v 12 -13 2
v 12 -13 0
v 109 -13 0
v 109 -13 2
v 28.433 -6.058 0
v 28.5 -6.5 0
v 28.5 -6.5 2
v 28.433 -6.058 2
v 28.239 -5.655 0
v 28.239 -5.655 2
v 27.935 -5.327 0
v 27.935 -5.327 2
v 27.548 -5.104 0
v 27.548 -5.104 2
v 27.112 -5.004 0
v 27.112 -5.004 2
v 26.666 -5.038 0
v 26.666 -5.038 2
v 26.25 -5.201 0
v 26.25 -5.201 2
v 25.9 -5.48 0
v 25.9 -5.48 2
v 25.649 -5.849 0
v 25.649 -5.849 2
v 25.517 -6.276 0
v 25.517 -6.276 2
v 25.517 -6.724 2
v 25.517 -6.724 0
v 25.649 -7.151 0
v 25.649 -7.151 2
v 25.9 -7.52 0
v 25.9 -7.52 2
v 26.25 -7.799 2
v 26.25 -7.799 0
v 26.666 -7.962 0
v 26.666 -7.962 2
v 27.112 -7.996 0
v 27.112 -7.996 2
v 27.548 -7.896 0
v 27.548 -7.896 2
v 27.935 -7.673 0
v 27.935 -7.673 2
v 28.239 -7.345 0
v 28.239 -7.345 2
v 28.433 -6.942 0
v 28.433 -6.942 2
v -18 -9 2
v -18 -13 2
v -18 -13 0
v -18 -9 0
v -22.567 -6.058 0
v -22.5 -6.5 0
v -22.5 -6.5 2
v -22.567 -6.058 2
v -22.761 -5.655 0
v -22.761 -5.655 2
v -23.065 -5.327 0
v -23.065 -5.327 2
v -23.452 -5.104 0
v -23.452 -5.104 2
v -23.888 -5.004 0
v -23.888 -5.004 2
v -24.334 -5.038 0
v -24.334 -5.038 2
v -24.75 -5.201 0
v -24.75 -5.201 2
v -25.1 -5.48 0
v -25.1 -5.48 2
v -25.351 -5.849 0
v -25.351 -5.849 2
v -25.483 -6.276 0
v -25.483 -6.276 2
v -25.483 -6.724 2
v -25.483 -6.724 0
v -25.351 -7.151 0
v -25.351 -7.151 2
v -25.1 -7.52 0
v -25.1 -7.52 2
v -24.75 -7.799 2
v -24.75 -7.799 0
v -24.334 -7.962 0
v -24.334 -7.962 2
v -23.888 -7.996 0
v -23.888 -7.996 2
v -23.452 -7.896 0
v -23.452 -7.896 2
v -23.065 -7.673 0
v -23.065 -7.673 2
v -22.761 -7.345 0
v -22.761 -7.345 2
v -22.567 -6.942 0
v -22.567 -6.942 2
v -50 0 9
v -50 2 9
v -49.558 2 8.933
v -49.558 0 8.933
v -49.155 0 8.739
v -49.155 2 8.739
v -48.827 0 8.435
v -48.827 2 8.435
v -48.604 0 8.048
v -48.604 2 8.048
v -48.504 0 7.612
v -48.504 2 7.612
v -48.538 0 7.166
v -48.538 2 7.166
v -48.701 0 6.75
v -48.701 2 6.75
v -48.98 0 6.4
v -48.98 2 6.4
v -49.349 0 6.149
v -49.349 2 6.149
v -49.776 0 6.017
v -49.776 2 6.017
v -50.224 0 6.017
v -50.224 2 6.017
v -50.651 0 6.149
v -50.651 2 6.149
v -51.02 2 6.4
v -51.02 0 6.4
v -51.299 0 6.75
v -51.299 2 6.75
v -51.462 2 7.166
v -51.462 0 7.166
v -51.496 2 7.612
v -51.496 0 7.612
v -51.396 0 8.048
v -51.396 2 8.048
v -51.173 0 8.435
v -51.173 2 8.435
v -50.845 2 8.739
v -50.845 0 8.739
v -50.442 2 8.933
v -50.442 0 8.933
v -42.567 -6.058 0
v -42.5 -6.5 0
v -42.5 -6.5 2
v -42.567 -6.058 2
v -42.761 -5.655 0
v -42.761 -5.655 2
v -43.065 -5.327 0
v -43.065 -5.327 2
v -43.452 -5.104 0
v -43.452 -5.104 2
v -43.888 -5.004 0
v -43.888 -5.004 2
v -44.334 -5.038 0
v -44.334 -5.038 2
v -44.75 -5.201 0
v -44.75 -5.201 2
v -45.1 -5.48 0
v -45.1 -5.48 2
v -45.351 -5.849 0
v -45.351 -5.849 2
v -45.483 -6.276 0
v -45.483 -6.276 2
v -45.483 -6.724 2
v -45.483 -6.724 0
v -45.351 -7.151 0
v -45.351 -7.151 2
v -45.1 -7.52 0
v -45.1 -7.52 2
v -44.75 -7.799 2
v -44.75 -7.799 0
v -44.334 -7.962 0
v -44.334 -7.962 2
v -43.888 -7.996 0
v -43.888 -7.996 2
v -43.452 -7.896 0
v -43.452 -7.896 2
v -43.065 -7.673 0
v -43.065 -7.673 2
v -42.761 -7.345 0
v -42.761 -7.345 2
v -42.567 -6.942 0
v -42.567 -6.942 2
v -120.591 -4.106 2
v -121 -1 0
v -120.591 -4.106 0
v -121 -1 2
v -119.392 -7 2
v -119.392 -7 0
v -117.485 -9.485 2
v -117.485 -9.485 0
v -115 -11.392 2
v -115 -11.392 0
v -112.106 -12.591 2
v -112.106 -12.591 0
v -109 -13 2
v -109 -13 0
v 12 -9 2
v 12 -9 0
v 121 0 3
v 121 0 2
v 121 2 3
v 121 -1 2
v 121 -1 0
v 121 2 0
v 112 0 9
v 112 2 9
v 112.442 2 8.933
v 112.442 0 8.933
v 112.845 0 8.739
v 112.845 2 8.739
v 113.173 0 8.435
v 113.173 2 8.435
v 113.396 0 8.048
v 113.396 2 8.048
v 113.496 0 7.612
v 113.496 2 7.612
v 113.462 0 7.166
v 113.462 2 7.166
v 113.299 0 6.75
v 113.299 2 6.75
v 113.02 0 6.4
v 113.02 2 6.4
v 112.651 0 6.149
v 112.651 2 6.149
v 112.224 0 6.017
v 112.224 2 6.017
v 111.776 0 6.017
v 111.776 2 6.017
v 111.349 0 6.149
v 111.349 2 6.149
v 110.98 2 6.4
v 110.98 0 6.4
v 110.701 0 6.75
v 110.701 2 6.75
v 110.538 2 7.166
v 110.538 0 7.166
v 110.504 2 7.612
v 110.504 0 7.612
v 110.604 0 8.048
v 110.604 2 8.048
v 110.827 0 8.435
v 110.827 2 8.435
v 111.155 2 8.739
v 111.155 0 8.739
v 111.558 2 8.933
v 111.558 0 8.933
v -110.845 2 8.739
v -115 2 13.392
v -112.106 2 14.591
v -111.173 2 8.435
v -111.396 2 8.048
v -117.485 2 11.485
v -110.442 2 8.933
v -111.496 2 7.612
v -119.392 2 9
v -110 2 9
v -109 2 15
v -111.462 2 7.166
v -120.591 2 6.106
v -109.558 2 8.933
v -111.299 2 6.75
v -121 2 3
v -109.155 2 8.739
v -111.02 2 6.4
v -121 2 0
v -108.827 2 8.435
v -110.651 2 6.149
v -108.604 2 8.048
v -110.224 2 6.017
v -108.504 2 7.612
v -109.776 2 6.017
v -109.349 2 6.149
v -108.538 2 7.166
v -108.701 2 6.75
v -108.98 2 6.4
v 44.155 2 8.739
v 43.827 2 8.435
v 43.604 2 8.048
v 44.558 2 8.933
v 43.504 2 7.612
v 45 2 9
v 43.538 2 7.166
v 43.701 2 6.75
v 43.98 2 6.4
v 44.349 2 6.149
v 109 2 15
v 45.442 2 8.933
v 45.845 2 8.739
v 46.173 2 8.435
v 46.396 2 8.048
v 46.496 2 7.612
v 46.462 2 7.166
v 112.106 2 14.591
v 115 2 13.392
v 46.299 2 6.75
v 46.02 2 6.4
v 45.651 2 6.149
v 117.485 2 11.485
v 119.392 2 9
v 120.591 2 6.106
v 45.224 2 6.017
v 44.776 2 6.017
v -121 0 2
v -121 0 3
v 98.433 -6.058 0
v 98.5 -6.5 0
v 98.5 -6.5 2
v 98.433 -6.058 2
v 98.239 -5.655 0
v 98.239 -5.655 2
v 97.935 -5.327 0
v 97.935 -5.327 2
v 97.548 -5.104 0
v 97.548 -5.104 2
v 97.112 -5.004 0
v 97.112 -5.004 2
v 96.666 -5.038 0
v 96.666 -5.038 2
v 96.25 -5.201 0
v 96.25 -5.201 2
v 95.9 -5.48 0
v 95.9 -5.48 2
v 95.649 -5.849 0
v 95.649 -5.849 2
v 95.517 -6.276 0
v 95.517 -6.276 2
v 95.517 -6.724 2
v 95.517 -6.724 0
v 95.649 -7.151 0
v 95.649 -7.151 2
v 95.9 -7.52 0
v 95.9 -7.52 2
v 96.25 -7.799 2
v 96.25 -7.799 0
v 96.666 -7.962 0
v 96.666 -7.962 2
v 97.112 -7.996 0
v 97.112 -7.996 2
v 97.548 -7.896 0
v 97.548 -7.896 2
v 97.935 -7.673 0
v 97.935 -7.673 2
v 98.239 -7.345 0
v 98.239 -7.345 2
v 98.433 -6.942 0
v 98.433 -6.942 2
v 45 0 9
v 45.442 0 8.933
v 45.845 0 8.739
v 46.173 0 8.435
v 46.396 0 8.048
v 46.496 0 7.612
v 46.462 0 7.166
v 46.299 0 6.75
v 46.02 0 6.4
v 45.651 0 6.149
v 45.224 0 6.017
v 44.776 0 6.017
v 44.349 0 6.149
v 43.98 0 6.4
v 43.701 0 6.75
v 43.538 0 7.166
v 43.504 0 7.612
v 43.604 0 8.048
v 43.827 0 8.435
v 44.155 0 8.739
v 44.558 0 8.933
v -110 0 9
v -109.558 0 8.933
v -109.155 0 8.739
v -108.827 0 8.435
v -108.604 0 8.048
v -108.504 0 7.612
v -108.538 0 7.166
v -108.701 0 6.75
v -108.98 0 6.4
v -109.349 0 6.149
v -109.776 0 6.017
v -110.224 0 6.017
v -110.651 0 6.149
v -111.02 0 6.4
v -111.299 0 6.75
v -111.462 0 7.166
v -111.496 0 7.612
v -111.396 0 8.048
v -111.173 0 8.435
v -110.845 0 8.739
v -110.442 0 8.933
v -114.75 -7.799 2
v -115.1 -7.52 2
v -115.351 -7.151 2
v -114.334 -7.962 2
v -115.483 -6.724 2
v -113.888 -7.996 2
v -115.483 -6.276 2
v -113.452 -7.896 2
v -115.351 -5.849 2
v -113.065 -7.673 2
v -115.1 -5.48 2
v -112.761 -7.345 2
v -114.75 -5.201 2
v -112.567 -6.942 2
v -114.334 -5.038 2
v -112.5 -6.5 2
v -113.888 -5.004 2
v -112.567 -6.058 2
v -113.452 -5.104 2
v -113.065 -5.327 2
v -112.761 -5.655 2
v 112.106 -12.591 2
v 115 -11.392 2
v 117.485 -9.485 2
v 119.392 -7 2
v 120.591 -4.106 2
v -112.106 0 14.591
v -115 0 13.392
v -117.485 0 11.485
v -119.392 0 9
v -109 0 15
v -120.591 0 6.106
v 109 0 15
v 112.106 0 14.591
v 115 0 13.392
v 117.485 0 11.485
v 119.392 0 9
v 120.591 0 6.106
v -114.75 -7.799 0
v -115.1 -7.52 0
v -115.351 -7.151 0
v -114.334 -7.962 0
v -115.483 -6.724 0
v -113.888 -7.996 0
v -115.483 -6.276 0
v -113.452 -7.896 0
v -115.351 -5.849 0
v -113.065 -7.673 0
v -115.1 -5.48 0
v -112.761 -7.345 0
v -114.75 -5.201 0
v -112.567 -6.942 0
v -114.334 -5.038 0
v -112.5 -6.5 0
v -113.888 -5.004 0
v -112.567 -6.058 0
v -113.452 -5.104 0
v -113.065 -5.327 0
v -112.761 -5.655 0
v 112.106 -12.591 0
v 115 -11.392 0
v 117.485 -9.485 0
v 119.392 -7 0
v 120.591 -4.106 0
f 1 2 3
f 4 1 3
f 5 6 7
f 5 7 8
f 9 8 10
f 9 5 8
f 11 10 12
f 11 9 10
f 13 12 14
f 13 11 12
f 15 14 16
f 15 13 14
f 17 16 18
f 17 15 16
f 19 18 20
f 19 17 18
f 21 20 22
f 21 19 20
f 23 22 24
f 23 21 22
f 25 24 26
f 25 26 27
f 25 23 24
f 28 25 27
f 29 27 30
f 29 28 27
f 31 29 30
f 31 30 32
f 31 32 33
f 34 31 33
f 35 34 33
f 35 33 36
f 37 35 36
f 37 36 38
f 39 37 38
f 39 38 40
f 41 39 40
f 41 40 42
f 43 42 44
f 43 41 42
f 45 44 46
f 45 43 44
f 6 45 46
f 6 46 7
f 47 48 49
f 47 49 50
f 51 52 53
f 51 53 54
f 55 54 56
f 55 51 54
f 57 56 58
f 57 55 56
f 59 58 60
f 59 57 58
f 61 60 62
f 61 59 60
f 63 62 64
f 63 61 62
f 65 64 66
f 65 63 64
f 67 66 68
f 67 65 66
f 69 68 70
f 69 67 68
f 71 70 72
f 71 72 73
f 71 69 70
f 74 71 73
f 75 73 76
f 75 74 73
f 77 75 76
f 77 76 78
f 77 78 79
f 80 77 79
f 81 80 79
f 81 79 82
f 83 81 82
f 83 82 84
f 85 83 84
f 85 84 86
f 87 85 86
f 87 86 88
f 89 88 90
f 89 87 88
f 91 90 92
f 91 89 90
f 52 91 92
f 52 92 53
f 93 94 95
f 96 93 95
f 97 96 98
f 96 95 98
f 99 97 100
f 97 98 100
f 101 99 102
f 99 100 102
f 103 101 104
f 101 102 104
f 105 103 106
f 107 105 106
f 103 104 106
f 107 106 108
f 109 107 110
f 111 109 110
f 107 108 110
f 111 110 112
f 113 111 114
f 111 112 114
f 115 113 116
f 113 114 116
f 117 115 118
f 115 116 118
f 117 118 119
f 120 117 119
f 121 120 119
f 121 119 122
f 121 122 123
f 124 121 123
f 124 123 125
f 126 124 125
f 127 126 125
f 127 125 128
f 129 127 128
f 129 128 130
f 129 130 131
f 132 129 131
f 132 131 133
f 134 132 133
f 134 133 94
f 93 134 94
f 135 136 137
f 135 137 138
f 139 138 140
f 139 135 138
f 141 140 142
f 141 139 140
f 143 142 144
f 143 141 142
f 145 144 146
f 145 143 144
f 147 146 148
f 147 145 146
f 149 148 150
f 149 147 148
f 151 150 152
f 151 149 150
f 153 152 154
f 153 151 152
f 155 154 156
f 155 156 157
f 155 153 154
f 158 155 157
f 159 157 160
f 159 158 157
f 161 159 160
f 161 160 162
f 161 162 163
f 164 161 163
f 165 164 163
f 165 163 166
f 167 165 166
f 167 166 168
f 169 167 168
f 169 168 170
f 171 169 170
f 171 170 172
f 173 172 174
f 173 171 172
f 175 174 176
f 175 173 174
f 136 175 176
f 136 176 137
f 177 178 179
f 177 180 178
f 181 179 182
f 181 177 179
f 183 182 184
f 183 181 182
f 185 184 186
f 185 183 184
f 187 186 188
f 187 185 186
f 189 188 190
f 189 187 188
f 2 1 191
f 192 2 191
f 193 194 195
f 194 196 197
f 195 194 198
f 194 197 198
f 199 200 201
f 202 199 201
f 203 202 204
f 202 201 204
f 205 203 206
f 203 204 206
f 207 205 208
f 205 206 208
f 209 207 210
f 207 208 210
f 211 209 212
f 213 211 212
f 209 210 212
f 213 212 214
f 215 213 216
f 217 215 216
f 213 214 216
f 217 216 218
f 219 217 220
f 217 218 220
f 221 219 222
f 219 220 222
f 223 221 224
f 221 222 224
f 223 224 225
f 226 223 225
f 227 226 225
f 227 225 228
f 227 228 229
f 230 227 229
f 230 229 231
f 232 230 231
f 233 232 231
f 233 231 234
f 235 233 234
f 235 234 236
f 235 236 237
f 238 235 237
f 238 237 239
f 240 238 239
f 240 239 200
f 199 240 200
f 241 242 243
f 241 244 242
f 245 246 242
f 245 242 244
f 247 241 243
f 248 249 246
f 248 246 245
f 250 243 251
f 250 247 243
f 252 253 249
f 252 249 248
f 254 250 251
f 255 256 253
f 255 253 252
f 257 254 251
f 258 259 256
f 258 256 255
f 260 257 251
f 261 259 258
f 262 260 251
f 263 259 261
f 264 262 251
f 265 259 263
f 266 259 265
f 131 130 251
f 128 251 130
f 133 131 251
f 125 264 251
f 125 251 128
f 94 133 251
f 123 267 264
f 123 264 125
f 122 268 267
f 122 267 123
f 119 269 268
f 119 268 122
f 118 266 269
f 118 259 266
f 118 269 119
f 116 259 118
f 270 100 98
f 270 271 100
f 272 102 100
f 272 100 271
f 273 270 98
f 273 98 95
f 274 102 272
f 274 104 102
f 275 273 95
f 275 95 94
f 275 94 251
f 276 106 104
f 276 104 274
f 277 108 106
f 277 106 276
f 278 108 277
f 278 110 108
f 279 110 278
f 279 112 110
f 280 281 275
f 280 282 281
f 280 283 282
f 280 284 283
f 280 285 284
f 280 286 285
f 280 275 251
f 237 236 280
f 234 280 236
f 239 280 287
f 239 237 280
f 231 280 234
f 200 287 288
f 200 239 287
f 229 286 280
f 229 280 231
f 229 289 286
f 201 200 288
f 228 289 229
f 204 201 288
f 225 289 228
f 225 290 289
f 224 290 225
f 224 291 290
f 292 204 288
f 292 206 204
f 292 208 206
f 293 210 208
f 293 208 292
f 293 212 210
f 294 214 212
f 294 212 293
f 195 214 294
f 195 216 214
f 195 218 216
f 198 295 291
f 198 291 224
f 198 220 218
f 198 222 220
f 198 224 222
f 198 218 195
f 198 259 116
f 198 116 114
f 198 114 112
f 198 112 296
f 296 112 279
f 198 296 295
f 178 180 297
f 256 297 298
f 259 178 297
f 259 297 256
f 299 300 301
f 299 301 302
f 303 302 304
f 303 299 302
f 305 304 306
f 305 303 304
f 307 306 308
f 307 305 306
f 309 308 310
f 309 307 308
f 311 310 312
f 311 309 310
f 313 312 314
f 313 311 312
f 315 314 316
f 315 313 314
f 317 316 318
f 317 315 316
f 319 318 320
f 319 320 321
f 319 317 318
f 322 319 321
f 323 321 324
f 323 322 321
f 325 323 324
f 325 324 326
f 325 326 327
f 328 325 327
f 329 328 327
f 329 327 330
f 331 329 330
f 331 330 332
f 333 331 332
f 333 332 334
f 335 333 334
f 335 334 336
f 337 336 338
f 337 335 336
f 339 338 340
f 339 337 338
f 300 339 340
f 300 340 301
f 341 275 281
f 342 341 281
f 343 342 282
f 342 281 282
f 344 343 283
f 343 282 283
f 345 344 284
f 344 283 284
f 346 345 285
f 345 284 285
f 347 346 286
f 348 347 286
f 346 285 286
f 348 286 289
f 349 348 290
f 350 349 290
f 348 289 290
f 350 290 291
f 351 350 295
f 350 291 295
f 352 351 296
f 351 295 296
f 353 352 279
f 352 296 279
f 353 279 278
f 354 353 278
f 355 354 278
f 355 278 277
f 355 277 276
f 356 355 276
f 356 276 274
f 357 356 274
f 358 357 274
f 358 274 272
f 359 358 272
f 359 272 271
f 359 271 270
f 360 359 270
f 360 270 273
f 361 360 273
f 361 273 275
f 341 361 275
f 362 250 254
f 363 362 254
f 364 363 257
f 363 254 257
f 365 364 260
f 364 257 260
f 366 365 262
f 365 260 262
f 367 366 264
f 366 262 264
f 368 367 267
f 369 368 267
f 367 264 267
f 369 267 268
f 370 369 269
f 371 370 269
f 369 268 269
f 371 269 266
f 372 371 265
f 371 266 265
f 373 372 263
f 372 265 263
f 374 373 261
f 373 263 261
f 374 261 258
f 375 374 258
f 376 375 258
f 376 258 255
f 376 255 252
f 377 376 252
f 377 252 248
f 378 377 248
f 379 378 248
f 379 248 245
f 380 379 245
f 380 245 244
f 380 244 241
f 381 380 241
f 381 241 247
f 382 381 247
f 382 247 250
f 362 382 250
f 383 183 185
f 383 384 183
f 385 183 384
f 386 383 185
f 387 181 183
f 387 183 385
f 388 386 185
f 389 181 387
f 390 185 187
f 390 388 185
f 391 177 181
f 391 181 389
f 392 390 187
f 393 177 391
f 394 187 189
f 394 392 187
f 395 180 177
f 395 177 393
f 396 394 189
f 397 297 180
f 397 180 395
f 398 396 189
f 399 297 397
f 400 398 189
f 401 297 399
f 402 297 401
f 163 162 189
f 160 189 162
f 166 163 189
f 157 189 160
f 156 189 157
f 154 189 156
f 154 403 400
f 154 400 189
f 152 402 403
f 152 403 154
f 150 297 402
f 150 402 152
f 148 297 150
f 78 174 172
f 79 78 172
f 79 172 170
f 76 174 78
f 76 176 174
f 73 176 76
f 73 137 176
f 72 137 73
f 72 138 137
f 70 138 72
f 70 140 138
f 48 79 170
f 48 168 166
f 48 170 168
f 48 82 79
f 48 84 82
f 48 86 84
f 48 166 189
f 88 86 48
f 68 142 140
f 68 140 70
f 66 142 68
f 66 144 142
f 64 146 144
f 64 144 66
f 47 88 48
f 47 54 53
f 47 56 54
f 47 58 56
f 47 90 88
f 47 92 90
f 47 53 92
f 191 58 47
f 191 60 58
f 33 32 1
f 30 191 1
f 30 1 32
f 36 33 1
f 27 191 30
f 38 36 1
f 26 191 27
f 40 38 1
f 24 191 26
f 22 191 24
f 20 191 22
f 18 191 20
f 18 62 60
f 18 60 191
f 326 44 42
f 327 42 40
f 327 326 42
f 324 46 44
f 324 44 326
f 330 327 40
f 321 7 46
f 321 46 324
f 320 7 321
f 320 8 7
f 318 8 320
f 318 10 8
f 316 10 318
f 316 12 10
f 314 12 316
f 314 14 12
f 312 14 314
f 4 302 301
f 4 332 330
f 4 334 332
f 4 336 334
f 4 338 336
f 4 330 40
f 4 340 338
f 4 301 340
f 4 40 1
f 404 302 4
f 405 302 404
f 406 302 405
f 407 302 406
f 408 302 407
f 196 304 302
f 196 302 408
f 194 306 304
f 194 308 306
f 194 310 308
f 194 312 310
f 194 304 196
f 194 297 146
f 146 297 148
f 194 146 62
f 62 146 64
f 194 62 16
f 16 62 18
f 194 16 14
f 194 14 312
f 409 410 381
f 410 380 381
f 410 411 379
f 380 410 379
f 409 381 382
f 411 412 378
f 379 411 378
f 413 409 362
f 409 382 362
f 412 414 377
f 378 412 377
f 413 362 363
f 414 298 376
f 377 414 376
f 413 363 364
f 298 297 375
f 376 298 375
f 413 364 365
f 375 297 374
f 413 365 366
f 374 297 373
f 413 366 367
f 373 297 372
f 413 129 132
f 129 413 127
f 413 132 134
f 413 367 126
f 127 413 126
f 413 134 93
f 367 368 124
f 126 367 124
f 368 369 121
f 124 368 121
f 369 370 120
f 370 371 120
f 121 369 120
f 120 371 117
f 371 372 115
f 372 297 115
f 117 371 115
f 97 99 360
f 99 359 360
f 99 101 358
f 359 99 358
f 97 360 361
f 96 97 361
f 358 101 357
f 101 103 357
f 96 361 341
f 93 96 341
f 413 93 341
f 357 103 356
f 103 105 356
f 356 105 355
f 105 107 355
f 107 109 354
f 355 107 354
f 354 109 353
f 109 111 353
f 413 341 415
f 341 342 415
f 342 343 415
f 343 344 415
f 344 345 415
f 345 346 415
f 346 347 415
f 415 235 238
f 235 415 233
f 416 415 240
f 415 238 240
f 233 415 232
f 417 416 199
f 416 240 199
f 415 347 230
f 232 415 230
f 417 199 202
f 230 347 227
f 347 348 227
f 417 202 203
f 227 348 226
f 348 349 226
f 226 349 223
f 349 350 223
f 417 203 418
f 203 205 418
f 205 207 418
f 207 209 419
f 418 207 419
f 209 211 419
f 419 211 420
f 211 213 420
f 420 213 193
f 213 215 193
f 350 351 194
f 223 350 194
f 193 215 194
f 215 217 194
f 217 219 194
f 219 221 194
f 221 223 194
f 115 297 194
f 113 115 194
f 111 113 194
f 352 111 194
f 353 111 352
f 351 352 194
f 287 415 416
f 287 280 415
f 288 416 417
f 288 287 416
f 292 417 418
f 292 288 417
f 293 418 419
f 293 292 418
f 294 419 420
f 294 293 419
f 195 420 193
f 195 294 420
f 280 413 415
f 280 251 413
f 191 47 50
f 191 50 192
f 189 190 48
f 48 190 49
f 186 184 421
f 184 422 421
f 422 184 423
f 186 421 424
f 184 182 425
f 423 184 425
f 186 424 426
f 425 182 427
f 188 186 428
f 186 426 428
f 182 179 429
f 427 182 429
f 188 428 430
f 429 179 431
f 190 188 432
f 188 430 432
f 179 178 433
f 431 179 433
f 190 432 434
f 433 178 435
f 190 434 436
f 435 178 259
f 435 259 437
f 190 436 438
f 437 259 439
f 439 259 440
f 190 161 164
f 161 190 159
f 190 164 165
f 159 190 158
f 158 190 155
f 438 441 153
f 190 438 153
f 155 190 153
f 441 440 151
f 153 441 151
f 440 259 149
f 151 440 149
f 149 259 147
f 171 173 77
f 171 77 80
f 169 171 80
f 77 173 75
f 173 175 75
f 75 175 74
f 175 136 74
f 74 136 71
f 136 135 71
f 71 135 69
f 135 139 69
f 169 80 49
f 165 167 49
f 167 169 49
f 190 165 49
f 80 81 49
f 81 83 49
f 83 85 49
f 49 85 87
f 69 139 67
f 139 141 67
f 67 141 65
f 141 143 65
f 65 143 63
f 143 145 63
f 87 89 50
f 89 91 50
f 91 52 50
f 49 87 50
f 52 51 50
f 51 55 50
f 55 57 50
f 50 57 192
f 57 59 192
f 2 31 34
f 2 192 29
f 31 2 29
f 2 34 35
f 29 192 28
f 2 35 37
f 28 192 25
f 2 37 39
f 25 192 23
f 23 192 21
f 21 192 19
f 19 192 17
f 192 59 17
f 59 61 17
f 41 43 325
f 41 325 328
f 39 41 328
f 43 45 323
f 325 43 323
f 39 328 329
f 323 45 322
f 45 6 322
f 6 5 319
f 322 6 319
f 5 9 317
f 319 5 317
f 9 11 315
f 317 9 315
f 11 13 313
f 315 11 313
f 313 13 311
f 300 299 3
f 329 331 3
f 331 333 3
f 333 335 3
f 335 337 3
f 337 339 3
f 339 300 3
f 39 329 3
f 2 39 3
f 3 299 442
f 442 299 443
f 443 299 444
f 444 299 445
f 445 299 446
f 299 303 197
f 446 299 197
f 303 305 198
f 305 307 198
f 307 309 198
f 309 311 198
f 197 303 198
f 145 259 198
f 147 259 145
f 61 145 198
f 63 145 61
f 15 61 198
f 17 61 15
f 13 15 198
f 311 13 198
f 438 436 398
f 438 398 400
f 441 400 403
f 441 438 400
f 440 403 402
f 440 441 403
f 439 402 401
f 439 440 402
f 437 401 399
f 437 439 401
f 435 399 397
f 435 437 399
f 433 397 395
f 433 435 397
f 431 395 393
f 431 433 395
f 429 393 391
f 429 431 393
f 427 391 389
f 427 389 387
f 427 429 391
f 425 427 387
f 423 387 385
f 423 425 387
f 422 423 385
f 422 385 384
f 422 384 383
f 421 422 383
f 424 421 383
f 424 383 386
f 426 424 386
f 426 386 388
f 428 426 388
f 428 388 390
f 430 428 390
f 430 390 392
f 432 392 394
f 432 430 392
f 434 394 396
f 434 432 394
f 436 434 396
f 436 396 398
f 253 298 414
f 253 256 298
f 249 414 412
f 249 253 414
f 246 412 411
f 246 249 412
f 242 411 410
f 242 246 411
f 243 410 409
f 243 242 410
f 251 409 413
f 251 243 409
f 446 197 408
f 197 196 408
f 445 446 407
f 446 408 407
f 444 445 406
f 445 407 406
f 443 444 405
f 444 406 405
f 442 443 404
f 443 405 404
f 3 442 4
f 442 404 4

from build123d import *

# Parameters (mm, degrees)
SKETCH1_W           = 242
SKETCH1_H           = 13
SKETCH1_R           = 1.5
BOSS_EXTRUDE1_DEPTH = 2
CUT_EXTRUDE1_REACH  = 123.713
SKETCH2_W           = 30
SKETCH2_H           = 4
SKETCH3_W           = 242
SKETCH3_H           = 2
BOSS_EXTRUDE2_DEPTH = 15
CUT_EXTRUDE2_REACH  = 124.845
SKETCH4_R           = 1.5
FILLET1_R           = 12


with BuildPart() as part:
    # Sketch1 → Boss-Extrude1 (new body)
    with BuildSketch(Plane.XY):
        with Locations((0, -6.5)):
            Rectangle(SKETCH1_W, SKETCH1_H)
        with Locations((-114, -6.5)):
            Circle(SKETCH1_R, mode=Mode.SUBTRACT)
        with Locations((-44, -6.5)):
            Circle(SKETCH1_R, mode=Mode.SUBTRACT)
        with Locations((-24, -6.5)):
            Circle(SKETCH1_R, mode=Mode.SUBTRACT)
        with Locations((27, -6.5)):
            Circle(SKETCH1_R, mode=Mode.SUBTRACT)
        with Locations((97, -6.5)):
            Circle(SKETCH1_R, mode=Mode.SUBTRACT)
    extrude(amount=BOSS_EXTRUDE1_DEPTH)

    # Sketch2 → Cut-Extrude1 (cut, up to next)
    with BuildSketch(Plane.XY.offset(2), mode=Mode.PRIVATE) as cut_extrude1_sk1:
        with Locations((-3, -11)):
            Rectangle(SKETCH2_W, SKETCH2_H)
    cut_extrude1_tool1 = extrude(cut_extrude1_sk1.sketch, amount=-CUT_EXTRUDE1_REACH, mode=Mode.PRIVATE) & part.part
    add(cut_extrude1_tool1.solids().sort_by_distance((-3, -11, 2))[0], mode=Mode.SUBTRACT)

    # Sketch3 → Boss-Extrude2 (add)
    with BuildSketch(Plane.XY):
        with Locations((0, 1)):
            Rectangle(SKETCH3_W, SKETCH3_H)
    extrude(amount=BOSS_EXTRUDE2_DEPTH)

    # Sketch4 → Cut-Extrude2 (cut, up to next)
    with BuildSketch(Plane(origin=(0, 2, 0), x_dir=(1, 0, 0), z_dir=(0, 1, 0)), mode=Mode.PRIVATE) as cut_extrude2_sk1:
        with Locations(Location((-110, -7.5, 0), (0, 0, 270))):
            Circle(SKETCH4_R)
    cut_extrude2_tool1 = extrude(cut_extrude2_sk1.sketch, amount=-CUT_EXTRUDE2_REACH, mode=Mode.PRIVATE) & part.part
    # Sketch4 → Cut-Extrude2 (cut, up to next)
    with BuildSketch(Plane(origin=(0, 2, 0), x_dir=(1, 0, 0), z_dir=(0, 1, 0)), mode=Mode.PRIVATE) as cut_extrude2_sk2:
        with Locations(Location((-50, -7.5, 0), (0, 0, 270))):
            Circle(SKETCH4_R)
    cut_extrude2_tool2 = extrude(cut_extrude2_sk2.sketch, amount=-CUT_EXTRUDE2_REACH, mode=Mode.PRIVATE) & part.part
    # Sketch4 → Cut-Extrude2 (cut, up to next)
    with BuildSketch(Plane(origin=(0, 2, 0), x_dir=(1, 0, 0), z_dir=(0, 1, 0)), mode=Mode.PRIVATE) as cut_extrude2_sk3:
        with Locations(Location((45, -7.5, 0), (0, 0, 270))):
            Circle(SKETCH4_R)
    cut_extrude2_tool3 = extrude(cut_extrude2_sk3.sketch, amount=-CUT_EXTRUDE2_REACH, mode=Mode.PRIVATE) & part.part
    # Sketch4 → Cut-Extrude2 (cut, up to next)
    with BuildSketch(Plane(origin=(0, 2, 0), x_dir=(1, 0, 0), z_dir=(0, 1, 0)), mode=Mode.PRIVATE) as cut_extrude2_sk4:
        with Locations(Location((112, -7.5, 0), (0, 0, 270))):
            Circle(SKETCH4_R)
    cut_extrude2_tool4 = extrude(cut_extrude2_sk4.sketch, amount=-CUT_EXTRUDE2_REACH, mode=Mode.PRIVATE) & part.part
    add(cut_extrude2_tool1.solids().sort_by_distance((-110, 2, 7.5))[0], mode=Mode.SUBTRACT)
    add(cut_extrude2_tool2.solids().sort_by_distance((-50, 2, 7.5))[0], mode=Mode.SUBTRACT)
    add(cut_extrude2_tool3.solids().sort_by_distance((45, 2, 7.5))[0], mode=Mode.SUBTRACT)
    add(cut_extrude2_tool4.solids().sort_by_distance((112, 2, 7.5))[0], mode=Mode.SUBTRACT)

    # Fillet1
    fillet1_edges = [part.edges().sort_by_distance(p)[0] for p in [
        (-121, 1, 15),
        (121, 1, 15),
        (121, -13, 1),
        (-121, -13, 1),
    ]]
    fillet(fillet1_edges, radius=FILLET1_R)


solid = part.part
